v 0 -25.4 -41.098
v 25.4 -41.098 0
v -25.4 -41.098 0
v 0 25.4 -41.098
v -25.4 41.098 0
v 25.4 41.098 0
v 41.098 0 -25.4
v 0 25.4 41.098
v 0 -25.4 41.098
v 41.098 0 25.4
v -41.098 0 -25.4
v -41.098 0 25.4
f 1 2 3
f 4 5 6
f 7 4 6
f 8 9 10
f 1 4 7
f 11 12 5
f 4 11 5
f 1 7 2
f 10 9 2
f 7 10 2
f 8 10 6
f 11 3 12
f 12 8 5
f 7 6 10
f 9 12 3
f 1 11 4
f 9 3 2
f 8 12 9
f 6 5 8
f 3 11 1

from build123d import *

# Parameters (mm, degrees)
F7_R      = 29.3293936748
F8_DEPTH  = 9.9209962727
F10_R     = 29.3293936748
F11_DEPTH = 9.9209962727
F13_R     = 29.3293936748
F14_DEPTH = 9.9209962727
F16_R     = 29.3293936748
F17_DEPTH = 9.9209962727
F19_R     = 29.3293936748
F20_DEPTH = 9.9209962727
F22_R     = 29.3293936748
F23_DEPTH = 9.9209962727
F25_R     = 29.3293936748
F26_DEPTH = 9.9209962727
F28_R     = 29.3293936748
F29_DEPTH = 9.9209962727
F31_R     = 29.3293936748
F32_DEPTH = 9.9209962727
F34_R     = 29.3293936748
F35_DEPTH = 9.9209962727
F37_R     = 29.3293936748
F38_DEPTH = 9.9209962727
F40_R     = 29.3293936748
F41_DEPTH = 9.9209962727
F43_R     = 29.3293936748
F44_DEPTH = 9.9209962727
F46_R     = 29.3293936748
F47_DEPTH = 9.9209962727
F49_R     = 29.3293936748
F50_DEPTH = 9.9209962727
F52_R     = 29.3293936748
F53_DEPTH = 9.9209962727
F55_R     = 29.3293936748
F56_DEPTH = 9.9209962727
F58_R     = 29.3293936748
F59_DEPTH = 9.9209962727
F61_R     = 29.3293936748
F64_DEPTH = 9.9209962727
F63_R     = 29.3293936748
F65_DEPTH = 9.9209962727


with BuildPart() as f3:
    # F1 (on Front) → F3 (revolve)
    with BuildSketch(Plane.XZ):
        with BuildLine():
            Line((0, 48.3136710278), (0, -48.3136710278))
            ThreePointArc((0, -48.3136710278), (48.3136710278, 0), (0, 48.3136710278))
        make_face()
    revolve(axis=Axis((0, 0, 56.2952049077), (0, 0, 1)))

    # F7 (on 3pt) → F8 (cut, through all)
    with BuildSketch(Plane(origin=(13.6993544381, 0, 35.8653755428), x_dir=(0.934172359, 0, -0.3568220898), z_dir=(-0.3568220898, 0, -0.934172359))):
        Circle(F7_R)
    extrude(amount=-F8_DEPTH, mode=Mode.SUBTRACT)

    # F10 (on 3pt) → F11 (cut, through all)
    with BuildSketch(Plane(origin=(-13.6993544381, 0, 35.8653755428), x_dir=(0.934172359, 0, 0.3568220898), z_dir=(0.3568220898, 0, -0.934172359))):
        Circle(F10_R)
    extrude(amount=-F11_DEPTH, mode=Mode.SUBTRACT)

    # F13 (on 3pt) → F14 (cut, through all)
    with BuildSketch(Plane(origin=(-22.1660211047, -22.1660211047, 22.1660211047), x_dir=(0.8164965809, -0.4082482905, 0.4082482905), z_dir=(-0.5773502692, -0.5773502692, 0.5773502692))):
        Circle(F13_R)
    extrude(amount=F14_DEPTH, mode=Mode.SUBTRACT)

    # F16 (on 3pt) → F17 (cut, through all)
    with BuildSketch(Plane(origin=(0, -35.8653755428, 13.6993544381), x_dir=(1, 0, 0), z_dir=(0, -0.934172359, 0.3568220898))):
        Circle(F16_R)
    extrude(amount=F17_DEPTH, mode=Mode.SUBTRACT)

    # F19 (on 3pt) → F20 (cut, through all)
    with BuildSketch(Plane(origin=(22.1660211047, -22.1660211047, 22.1660211047), x_dir=(0.8164965809, 0.4082482905, -0.4082482905), z_dir=(0.5773502692, -0.5773502692, 0.5773502692))):
        Circle(F19_R)
    extrude(amount=F20_DEPTH, mode=Mode.SUBTRACT)

    # F22 (on 3pt) → F23 (cut, through all)
    with BuildSketch(Plane(origin=(22.1660211047, 22.1660211047, 22.1660211047), x_dir=(-0.8164965809, 0.4082482905, 0.4082482905), z_dir=(0.5773502692, 0.5773502692, 0.5773502692))):
        Circle(F22_R)
    extrude(amount=F23_DEPTH, mode=Mode.SUBTRACT)

    # F25 (on 3pt) → F26 (cut, through all)
    with BuildSketch(Plane(origin=(0, 35.8653755428, 13.6993544381), x_dir=(1, 0, 0), z_dir=(0, -0.934172359, -0.3568220898))):
        Circle(F25_R)
    extrude(amount=-F26_DEPTH, mode=Mode.SUBTRACT)

    # F28 (on 3pt) → F29 (cut, through all)
    with BuildSketch(Plane(origin=(-22.1660211047, 22.1660211047, 22.1660211047), x_dir=(-0.8164965809, -0.4082482905, -0.4082482905), z_dir=(-0.5773502692, 0.5773502692, 0.5773502692))):
        Circle(F28_R)
    extrude(amount=F29_DEPTH, mode=Mode.SUBTRACT)

    # F31 (on 3pt) → F32 (cut, through all)
    with BuildSketch(Plane(origin=(35.8653755428, -13.6993544381, 0), x_dir=(-0.3568220898, -0.934172359, 0), z_dir=(-0.934172359, 0.3568220898, 0))):
        Circle(F31_R)
    extrude(amount=-F32_DEPTH, mode=Mode.SUBTRACT)

    # F34 (on 3pt) → F35 (cut, through all)
    with BuildSketch(Plane(origin=(35.8653755428, 13.6993544381, 0), x_dir=(0.3568220898, -0.934172359, 0), z_dir=(-0.934172359, -0.3568220898, 0))):
        Circle(F34_R)
    extrude(amount=-F35_DEPTH, mode=Mode.SUBTRACT)

    # F37 (on 3pt) → F38 (cut, through all)
    with BuildSketch(Plane(origin=(-35.8653755428, -13.6993544381, 0), x_dir=(-0.3568220898, 0.934172359, 0), z_dir=(0.934172359, 0.3568220898, 0))):
        Circle(F37_R)
    extrude(amount=-F38_DEPTH, mode=Mode.SUBTRACT)

    # F40 (on 3pt) → F41 (cut, through all)
    with BuildSketch(Plane(origin=(-35.8653755428, 13.6993544381, 0), x_dir=(0.3568220898, 0.934172359, 0), z_dir=(0.934172359, -0.3568220898, 0))):
        Circle(F40_R)
    extrude(amount=-F41_DEPTH, mode=Mode.SUBTRACT)

    # F43 (on 3pt) → F44 (cut, through all)
    with BuildSketch(Plane(origin=(-22.1660211047, 22.1660211047, -22.1660211047), x_dir=(0.8164965809, 0.4082482905, -0.4082482905), z_dir=(0.5773502692, -0.5773502692, 0.5773502692))):
        Circle(F43_R)
    extrude(amount=-F44_DEPTH, mode=Mode.SUBTRACT)

    # F46 (on 3pt) → F47 (cut, through all)
    with BuildSketch(Plane(origin=(0, 35.8653755428, -13.6993544381), x_dir=(1, 0, 0), z_dir=(0, -0.934172359, 0.3568220898))):
        Circle(F46_R)
    extrude(amount=-F47_DEPTH, mode=Mode.SUBTRACT)

    # F49 (on 3pt) → F50 (cut, through all)
    with BuildSketch(Plane(origin=(22.1660211047, 22.1660211047, -22.1660211047), x_dir=(0.8164965809, -0.4082482905, 0.4082482905), z_dir=(-0.5773502692, -0.5773502692, 0.5773502692))):
        Circle(F49_R)
    extrude(amount=-F50_DEPTH, mode=Mode.SUBTRACT)

    # F52 (on 3pt) → F53 (cut, through all)
    with BuildSketch(Plane(origin=(22.1660211047, -22.1660211047, -22.1660211047), x_dir=(-0.8164965809, -0.4082482905, -0.4082482905), z_dir=(-0.5773502692, 0.5773502692, 0.5773502692))):
        Circle(F52_R)
    extrude(amount=-F53_DEPTH, mode=Mode.SUBTRACT)

    # F55 (on 3pt) → F56 (cut, through all)
    with BuildSketch(Plane(origin=(13.6993544381, 0, -35.8653755428), x_dir=(0.934172359, 0, 0.3568220898), z_dir=(-0.3568220898, 0, 0.934172359))):
        Circle(F55_R)
    extrude(amount=-F56_DEPTH, mode=Mode.SUBTRACT)

    # F58 (on 3pt) → F59 (cut, through all)
    with BuildSketch(Plane(origin=(0, -35.8653755428, -13.6993544381), x_dir=(-1, 0, 0), z_dir=(0, 0.934172359, 0.3568220898))):
        Circle(F58_R)
    extrude(amount=-F59_DEPTH, mode=Mode.SUBTRACT)

    # F61 (on 3pt) → F64 (cut, through all)
    with BuildSketch(Plane(origin=(-13.6993544381, 0, -35.8653755428), x_dir=(0.934172359, 0, -0.3568220898), z_dir=(0.3568220898, 0, 0.934172359))):
        Circle(F61_R)
    extrude(amount=-F64_DEPTH, mode=Mode.SUBTRACT)

    # F63 (on 3pt) → F65 (cut, through all)
    with BuildSketch(Plane(origin=(-22.1660211047, -22.1660211047, -22.1660211047), x_dir=(0.8164965809, -0.4082482905, -0.4082482905), z_dir=(-0.5773502692, -0.5773502692, -0.5773502692))):
        Circle(F63_R)
    extrude(amount=F65_DEPTH, mode=Mode.SUBTRACT)


solid = f3.part
